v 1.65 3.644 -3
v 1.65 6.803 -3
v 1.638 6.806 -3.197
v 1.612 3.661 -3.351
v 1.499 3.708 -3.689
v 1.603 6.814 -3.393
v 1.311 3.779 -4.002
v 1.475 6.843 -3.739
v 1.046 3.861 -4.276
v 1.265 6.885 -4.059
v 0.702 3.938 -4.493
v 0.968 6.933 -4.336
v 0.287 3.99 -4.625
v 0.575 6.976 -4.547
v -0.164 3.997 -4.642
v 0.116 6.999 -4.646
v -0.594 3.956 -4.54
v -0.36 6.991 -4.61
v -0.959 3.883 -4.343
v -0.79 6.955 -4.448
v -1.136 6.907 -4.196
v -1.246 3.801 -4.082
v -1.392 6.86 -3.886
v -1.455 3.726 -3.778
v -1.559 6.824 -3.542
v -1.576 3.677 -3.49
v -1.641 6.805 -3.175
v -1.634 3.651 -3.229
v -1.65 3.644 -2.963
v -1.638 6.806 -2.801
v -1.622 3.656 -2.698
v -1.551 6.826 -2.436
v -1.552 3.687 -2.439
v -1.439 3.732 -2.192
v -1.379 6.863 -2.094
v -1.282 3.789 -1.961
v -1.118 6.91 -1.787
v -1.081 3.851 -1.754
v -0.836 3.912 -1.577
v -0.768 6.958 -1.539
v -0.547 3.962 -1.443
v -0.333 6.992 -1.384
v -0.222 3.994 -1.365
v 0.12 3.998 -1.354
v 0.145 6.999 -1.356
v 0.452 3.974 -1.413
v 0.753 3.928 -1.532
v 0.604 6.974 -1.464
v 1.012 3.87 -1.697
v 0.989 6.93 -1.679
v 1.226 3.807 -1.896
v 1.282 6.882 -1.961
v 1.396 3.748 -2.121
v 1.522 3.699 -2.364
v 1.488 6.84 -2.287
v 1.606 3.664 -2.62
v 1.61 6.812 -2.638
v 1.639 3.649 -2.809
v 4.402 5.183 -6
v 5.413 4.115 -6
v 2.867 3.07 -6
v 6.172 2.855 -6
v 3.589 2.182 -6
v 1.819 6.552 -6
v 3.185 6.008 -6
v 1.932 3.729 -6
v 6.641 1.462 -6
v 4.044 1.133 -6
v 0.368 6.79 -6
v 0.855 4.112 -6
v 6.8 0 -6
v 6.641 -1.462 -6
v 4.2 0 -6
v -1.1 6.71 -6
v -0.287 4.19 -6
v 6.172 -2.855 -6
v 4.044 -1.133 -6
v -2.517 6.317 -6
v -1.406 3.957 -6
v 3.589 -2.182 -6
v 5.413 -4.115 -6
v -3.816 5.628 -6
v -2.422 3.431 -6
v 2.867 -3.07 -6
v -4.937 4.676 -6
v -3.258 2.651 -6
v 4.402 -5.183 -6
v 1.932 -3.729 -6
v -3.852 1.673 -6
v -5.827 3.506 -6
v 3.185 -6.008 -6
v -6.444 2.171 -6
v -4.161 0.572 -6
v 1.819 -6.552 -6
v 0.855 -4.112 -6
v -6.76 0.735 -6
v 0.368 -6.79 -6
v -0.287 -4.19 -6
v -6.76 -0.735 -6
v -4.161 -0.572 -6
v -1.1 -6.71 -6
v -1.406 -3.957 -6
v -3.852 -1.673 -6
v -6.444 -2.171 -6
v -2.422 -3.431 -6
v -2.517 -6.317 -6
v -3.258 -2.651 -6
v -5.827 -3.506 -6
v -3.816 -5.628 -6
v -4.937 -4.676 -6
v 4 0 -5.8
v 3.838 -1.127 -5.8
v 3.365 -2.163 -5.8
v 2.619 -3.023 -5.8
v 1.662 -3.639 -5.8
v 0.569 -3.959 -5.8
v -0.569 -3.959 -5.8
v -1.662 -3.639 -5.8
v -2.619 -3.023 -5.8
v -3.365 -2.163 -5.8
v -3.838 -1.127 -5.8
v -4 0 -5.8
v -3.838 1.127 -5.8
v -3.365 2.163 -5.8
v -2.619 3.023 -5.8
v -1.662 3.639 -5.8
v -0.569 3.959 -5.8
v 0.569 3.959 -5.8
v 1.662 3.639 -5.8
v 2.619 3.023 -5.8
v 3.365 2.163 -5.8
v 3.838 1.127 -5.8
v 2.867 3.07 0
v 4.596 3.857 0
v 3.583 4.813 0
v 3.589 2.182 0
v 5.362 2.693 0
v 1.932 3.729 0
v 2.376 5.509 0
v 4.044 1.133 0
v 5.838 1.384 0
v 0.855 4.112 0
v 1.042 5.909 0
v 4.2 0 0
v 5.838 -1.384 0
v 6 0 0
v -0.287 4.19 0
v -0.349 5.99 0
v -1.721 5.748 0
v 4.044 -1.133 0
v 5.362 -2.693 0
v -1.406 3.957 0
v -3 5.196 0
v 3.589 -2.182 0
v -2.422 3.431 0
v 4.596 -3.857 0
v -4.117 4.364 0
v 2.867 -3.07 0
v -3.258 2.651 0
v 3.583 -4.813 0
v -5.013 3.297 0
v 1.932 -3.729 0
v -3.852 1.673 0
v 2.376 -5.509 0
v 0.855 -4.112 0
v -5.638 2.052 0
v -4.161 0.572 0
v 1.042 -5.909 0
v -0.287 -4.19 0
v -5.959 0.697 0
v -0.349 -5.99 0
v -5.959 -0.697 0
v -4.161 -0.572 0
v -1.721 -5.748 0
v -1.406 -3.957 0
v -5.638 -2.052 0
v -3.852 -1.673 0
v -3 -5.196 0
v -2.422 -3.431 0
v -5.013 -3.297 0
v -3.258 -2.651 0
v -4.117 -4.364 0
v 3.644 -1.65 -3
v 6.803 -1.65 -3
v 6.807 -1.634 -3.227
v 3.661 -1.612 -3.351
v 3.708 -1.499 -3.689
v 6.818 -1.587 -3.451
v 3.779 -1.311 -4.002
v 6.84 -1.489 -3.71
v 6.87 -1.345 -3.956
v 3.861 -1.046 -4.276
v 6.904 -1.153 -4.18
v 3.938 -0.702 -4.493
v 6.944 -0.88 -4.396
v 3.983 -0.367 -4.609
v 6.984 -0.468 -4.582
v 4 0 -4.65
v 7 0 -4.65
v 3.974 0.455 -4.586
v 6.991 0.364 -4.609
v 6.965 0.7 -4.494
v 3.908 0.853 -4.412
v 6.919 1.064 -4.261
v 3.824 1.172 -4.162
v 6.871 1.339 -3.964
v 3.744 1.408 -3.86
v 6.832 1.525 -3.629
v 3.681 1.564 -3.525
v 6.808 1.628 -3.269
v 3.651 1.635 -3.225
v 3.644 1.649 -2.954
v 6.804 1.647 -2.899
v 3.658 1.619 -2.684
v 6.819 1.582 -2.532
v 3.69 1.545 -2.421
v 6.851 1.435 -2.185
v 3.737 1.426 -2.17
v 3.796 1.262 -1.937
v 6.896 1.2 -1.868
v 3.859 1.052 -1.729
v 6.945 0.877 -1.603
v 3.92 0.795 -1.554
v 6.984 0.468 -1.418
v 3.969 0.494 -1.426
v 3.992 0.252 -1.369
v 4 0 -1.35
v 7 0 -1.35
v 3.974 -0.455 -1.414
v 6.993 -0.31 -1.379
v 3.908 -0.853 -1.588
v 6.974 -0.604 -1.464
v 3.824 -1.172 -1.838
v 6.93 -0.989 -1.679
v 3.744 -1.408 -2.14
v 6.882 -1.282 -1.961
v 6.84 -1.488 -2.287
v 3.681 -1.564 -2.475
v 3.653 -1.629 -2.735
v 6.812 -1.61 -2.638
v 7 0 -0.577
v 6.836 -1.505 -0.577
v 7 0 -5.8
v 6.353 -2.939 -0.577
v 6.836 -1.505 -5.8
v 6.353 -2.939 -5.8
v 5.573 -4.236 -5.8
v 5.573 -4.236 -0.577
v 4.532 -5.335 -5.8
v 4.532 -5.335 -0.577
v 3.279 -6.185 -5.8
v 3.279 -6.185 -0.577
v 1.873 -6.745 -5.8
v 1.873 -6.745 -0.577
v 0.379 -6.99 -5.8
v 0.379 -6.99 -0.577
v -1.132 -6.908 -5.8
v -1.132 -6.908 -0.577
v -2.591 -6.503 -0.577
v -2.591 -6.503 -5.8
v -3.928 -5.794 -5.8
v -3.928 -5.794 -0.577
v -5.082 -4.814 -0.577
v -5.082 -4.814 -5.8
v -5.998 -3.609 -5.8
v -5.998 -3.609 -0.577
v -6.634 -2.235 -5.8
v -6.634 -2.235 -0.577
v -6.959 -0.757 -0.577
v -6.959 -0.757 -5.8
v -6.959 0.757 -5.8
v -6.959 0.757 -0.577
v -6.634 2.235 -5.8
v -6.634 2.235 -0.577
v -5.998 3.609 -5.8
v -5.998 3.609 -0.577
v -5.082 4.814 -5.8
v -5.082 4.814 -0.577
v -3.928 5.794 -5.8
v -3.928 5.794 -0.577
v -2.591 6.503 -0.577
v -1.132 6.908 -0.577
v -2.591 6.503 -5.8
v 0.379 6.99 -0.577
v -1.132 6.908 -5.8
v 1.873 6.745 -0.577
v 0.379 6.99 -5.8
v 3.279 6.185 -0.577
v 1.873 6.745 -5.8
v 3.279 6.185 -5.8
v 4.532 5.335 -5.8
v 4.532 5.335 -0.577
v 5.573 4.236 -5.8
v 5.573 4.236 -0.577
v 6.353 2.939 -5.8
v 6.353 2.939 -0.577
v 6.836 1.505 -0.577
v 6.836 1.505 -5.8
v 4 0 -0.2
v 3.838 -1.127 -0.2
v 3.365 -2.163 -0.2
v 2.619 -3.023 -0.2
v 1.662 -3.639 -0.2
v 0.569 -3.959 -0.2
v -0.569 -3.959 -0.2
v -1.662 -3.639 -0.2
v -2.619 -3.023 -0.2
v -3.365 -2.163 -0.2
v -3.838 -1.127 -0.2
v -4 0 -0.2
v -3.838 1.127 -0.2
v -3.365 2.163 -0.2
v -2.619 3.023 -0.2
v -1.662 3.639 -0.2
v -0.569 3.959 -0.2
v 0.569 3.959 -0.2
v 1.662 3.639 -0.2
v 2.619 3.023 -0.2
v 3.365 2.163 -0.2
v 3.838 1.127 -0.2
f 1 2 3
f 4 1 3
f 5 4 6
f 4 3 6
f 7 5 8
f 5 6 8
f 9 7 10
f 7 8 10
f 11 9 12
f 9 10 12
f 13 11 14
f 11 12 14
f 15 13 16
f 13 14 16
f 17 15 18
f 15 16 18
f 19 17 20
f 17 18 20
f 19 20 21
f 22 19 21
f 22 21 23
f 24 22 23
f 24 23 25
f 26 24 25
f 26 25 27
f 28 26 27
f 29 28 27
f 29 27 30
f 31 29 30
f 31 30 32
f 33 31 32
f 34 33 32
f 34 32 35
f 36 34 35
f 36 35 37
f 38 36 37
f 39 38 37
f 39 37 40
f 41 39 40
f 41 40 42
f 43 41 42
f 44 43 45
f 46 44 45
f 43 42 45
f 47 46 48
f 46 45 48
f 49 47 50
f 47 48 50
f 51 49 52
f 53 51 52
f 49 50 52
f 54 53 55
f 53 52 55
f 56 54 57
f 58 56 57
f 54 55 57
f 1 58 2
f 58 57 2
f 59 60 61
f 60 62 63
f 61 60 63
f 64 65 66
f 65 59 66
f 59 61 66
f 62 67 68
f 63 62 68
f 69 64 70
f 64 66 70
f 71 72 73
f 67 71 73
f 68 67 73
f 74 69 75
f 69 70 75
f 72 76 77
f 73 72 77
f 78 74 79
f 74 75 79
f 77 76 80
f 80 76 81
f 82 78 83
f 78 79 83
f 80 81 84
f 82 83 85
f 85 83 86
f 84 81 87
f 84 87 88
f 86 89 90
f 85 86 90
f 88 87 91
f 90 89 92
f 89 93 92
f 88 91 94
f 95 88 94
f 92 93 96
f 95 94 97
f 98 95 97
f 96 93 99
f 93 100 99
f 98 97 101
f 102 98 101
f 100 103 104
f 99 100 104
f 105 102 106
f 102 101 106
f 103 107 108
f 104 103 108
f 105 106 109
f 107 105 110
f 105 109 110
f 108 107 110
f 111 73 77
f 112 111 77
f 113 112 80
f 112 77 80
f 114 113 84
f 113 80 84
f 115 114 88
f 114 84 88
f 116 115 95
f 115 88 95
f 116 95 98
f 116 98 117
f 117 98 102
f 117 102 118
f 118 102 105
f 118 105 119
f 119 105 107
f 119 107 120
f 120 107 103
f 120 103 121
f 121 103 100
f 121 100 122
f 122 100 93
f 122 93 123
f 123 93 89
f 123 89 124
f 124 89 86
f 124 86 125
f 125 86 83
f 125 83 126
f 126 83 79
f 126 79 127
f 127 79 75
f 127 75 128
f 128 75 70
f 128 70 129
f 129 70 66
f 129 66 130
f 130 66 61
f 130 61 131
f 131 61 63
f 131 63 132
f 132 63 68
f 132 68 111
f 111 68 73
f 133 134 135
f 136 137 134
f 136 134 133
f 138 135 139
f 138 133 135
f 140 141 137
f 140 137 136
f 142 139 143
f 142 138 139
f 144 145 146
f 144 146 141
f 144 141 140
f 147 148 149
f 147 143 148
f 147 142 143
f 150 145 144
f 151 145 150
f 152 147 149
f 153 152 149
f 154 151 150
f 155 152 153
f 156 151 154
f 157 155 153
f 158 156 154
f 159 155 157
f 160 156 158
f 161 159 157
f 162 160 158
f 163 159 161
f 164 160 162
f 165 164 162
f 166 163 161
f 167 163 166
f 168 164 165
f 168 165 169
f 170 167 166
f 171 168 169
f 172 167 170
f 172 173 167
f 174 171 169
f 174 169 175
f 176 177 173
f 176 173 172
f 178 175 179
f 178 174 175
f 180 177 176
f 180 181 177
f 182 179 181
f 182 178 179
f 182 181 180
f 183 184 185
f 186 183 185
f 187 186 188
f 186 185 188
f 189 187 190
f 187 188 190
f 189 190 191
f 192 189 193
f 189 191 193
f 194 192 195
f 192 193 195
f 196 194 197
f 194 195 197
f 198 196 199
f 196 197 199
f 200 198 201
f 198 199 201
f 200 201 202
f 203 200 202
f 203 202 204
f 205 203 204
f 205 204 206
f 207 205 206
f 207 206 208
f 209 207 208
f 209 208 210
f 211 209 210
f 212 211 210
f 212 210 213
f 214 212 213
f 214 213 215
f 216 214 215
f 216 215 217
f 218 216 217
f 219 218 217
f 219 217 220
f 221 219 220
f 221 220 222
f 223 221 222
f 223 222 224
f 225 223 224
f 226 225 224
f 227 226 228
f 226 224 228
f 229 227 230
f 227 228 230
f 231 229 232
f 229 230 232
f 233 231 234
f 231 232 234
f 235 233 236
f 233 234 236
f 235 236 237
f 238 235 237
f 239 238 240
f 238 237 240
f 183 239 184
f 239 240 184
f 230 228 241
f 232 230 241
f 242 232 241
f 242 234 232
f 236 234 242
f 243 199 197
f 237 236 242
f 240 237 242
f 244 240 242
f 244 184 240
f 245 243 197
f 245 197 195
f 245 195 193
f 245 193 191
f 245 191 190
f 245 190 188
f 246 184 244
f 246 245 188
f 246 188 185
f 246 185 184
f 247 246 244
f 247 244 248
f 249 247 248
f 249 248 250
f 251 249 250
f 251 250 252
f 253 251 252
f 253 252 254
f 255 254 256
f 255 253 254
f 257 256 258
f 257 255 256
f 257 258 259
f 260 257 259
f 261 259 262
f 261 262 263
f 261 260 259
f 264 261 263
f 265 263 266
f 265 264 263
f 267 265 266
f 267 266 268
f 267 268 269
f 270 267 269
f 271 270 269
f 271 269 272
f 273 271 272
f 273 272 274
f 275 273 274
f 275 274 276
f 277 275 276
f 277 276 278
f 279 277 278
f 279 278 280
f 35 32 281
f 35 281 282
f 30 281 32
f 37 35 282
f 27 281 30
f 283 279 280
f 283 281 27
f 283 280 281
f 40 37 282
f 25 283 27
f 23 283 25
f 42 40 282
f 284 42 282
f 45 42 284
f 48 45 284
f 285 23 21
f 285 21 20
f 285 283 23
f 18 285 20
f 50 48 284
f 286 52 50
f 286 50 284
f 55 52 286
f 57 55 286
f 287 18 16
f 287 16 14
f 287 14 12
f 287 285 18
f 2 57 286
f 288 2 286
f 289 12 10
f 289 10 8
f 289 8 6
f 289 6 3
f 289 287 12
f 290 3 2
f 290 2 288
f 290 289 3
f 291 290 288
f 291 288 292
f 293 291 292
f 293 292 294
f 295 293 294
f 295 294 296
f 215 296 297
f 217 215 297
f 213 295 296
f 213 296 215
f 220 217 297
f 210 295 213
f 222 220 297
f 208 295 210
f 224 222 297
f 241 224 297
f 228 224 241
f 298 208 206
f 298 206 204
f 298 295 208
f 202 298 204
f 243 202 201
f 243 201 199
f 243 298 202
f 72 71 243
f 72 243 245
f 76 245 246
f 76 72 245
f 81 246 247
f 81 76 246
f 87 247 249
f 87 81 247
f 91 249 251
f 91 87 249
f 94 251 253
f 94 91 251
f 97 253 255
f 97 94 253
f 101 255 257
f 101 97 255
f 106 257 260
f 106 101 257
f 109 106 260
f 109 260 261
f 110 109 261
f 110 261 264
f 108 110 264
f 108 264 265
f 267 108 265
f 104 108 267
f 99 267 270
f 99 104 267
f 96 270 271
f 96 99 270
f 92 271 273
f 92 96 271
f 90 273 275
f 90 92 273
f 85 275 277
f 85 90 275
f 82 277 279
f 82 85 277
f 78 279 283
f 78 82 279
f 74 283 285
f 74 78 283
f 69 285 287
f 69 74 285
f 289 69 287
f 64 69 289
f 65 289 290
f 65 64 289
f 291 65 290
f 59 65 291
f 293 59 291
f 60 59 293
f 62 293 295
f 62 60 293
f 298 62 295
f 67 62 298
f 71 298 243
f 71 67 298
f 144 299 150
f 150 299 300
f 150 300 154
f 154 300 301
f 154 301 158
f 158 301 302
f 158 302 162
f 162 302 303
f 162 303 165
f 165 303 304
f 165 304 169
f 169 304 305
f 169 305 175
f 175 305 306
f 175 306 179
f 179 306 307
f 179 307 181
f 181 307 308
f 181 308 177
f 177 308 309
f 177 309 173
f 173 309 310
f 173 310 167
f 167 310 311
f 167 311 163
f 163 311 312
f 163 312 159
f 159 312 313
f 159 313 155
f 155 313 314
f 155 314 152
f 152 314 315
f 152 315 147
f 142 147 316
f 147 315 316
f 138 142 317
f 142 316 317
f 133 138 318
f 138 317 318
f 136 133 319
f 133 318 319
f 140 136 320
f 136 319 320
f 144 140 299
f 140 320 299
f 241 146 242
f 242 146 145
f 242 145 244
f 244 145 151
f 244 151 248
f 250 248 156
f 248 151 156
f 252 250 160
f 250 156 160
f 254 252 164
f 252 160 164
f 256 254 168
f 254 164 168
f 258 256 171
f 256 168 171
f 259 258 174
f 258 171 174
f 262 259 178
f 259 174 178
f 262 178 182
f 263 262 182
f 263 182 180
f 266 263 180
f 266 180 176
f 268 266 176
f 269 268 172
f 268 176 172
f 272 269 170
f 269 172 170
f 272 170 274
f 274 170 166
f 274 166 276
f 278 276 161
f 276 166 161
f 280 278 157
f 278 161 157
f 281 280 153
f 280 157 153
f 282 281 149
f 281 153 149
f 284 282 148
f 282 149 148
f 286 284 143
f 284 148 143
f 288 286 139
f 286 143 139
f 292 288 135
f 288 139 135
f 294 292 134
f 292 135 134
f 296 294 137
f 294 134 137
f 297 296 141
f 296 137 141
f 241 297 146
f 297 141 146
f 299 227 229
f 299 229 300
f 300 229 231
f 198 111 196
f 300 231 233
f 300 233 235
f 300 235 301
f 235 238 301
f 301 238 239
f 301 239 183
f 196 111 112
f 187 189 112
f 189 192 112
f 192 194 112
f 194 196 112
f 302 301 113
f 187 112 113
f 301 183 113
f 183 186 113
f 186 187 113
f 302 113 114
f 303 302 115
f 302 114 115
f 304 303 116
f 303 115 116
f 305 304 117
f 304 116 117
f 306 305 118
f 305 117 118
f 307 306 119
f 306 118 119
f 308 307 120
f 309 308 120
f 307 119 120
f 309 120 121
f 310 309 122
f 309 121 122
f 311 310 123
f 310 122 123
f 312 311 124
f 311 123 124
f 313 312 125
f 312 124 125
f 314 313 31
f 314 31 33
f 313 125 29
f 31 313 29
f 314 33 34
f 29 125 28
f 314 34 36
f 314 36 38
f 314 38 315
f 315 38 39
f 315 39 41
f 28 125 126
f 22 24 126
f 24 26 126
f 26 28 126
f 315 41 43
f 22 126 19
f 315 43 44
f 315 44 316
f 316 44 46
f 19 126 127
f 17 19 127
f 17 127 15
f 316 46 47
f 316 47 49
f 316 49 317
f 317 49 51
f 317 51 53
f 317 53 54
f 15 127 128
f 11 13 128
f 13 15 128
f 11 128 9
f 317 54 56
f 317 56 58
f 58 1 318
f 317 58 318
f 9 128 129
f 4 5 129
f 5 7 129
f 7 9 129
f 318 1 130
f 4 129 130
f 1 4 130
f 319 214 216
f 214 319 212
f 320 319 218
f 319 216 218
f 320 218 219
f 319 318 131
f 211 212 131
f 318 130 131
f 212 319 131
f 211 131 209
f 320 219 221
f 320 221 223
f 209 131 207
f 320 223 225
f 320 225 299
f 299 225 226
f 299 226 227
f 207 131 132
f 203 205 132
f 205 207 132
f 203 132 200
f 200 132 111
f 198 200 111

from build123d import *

# Parameters (mm, degrees)
SKETCH1_W           = 6
SKETCH1_H           = 3
TAPPED_HOLE1_REACH  = 18.763
TAPPED_HOLE1_BORE_R = 1.65
CIRPATTERN1_COUNT   = 2
CIRPATTERN1_ANGLE   = 90
CHAMFER1_SIZE       = 0.2


with BuildPart() as part:
    # Sketch1 → Revolve1 (revolve)
    with BuildSketch(Plane(origin=(0, 0, 0), x_dir=(0, 0, -1), z_dir=(1, 0, 0)), mode=Mode.PRIVATE) as revolve1_sk:
        with Locations((3, 5.5)):
            Rectangle(SKETCH1_W, SKETCH1_H)
    revolve(revolve1_sk.sketch.rotate(Axis((0, 0, 0), (0, 0, -1)), 90), axis=Axis((0, 0, 0), (0, 0, -1)))

    # Tapped Hole1 bore → Tapped Hole1 (cut, up to next)
    with BuildSketch(Plane(origin=(0, 7, 0), x_dir=(1, 0, 0), z_dir=(0, 1, 0)), mode=Mode.PRIVATE) as tapped_hole1_sk1:
        with Locations((0, 3)):
            Circle(TAPPED_HOLE1_BORE_R)
    tapped_hole1_tool1 = extrude(tapped_hole1_sk1.sketch, amount=-TAPPED_HOLE1_REACH, mode=Mode.PRIVATE) & part.part
    tapped_hole1 = tapped_hole1_tool1.solids().sort_by_distance((0, 7, -3))[0]
    add(tapped_hole1, mode=Mode.SUBTRACT)

    # CirPattern1: Tapped Hole1 ×2 about axis
    cirpattern1_axis = Axis((0, 0, 0), (0, 0, -1))
    for i in range(1, CIRPATTERN1_COUNT):
        add(tapped_hole1.rotate(cirpattern1_axis, i * CIRPATTERN1_ANGLE / (CIRPATTERN1_COUNT - 1)), mode=Mode.SUBTRACT)

    # Chamfer1
    chamfer1_edges = [part.edges().sort_by_distance(p)[0] for p in [
        (-4, 0, -6),
        (-4, 0, 0),
        (-7, 0, -6),
    ]]
    chamfer(chamfer1_edges, length=CHAMFER1_SIZE)

    # Sketch4 → Cut-Revolve1 (revolve, cut)
    with BuildSketch(Plane(origin=(0, 0, 0), x_dir=(0, 0, -1), z_dir=(1, 0, 0)), mode=Mode.PRIVATE) as cut_revolve1_sk:
        Polygon((0.577350269, 7), (0, 6), (0, 7), align=None)
    revolve(cut_revolve1_sk.sketch.rotate(Axis((0, 0, 0), (0, 0, -1)), 90), axis=Axis((0, 0, 0), (0, 0, -1)), mode=Mode.SUBTRACT)


solid = part.part
